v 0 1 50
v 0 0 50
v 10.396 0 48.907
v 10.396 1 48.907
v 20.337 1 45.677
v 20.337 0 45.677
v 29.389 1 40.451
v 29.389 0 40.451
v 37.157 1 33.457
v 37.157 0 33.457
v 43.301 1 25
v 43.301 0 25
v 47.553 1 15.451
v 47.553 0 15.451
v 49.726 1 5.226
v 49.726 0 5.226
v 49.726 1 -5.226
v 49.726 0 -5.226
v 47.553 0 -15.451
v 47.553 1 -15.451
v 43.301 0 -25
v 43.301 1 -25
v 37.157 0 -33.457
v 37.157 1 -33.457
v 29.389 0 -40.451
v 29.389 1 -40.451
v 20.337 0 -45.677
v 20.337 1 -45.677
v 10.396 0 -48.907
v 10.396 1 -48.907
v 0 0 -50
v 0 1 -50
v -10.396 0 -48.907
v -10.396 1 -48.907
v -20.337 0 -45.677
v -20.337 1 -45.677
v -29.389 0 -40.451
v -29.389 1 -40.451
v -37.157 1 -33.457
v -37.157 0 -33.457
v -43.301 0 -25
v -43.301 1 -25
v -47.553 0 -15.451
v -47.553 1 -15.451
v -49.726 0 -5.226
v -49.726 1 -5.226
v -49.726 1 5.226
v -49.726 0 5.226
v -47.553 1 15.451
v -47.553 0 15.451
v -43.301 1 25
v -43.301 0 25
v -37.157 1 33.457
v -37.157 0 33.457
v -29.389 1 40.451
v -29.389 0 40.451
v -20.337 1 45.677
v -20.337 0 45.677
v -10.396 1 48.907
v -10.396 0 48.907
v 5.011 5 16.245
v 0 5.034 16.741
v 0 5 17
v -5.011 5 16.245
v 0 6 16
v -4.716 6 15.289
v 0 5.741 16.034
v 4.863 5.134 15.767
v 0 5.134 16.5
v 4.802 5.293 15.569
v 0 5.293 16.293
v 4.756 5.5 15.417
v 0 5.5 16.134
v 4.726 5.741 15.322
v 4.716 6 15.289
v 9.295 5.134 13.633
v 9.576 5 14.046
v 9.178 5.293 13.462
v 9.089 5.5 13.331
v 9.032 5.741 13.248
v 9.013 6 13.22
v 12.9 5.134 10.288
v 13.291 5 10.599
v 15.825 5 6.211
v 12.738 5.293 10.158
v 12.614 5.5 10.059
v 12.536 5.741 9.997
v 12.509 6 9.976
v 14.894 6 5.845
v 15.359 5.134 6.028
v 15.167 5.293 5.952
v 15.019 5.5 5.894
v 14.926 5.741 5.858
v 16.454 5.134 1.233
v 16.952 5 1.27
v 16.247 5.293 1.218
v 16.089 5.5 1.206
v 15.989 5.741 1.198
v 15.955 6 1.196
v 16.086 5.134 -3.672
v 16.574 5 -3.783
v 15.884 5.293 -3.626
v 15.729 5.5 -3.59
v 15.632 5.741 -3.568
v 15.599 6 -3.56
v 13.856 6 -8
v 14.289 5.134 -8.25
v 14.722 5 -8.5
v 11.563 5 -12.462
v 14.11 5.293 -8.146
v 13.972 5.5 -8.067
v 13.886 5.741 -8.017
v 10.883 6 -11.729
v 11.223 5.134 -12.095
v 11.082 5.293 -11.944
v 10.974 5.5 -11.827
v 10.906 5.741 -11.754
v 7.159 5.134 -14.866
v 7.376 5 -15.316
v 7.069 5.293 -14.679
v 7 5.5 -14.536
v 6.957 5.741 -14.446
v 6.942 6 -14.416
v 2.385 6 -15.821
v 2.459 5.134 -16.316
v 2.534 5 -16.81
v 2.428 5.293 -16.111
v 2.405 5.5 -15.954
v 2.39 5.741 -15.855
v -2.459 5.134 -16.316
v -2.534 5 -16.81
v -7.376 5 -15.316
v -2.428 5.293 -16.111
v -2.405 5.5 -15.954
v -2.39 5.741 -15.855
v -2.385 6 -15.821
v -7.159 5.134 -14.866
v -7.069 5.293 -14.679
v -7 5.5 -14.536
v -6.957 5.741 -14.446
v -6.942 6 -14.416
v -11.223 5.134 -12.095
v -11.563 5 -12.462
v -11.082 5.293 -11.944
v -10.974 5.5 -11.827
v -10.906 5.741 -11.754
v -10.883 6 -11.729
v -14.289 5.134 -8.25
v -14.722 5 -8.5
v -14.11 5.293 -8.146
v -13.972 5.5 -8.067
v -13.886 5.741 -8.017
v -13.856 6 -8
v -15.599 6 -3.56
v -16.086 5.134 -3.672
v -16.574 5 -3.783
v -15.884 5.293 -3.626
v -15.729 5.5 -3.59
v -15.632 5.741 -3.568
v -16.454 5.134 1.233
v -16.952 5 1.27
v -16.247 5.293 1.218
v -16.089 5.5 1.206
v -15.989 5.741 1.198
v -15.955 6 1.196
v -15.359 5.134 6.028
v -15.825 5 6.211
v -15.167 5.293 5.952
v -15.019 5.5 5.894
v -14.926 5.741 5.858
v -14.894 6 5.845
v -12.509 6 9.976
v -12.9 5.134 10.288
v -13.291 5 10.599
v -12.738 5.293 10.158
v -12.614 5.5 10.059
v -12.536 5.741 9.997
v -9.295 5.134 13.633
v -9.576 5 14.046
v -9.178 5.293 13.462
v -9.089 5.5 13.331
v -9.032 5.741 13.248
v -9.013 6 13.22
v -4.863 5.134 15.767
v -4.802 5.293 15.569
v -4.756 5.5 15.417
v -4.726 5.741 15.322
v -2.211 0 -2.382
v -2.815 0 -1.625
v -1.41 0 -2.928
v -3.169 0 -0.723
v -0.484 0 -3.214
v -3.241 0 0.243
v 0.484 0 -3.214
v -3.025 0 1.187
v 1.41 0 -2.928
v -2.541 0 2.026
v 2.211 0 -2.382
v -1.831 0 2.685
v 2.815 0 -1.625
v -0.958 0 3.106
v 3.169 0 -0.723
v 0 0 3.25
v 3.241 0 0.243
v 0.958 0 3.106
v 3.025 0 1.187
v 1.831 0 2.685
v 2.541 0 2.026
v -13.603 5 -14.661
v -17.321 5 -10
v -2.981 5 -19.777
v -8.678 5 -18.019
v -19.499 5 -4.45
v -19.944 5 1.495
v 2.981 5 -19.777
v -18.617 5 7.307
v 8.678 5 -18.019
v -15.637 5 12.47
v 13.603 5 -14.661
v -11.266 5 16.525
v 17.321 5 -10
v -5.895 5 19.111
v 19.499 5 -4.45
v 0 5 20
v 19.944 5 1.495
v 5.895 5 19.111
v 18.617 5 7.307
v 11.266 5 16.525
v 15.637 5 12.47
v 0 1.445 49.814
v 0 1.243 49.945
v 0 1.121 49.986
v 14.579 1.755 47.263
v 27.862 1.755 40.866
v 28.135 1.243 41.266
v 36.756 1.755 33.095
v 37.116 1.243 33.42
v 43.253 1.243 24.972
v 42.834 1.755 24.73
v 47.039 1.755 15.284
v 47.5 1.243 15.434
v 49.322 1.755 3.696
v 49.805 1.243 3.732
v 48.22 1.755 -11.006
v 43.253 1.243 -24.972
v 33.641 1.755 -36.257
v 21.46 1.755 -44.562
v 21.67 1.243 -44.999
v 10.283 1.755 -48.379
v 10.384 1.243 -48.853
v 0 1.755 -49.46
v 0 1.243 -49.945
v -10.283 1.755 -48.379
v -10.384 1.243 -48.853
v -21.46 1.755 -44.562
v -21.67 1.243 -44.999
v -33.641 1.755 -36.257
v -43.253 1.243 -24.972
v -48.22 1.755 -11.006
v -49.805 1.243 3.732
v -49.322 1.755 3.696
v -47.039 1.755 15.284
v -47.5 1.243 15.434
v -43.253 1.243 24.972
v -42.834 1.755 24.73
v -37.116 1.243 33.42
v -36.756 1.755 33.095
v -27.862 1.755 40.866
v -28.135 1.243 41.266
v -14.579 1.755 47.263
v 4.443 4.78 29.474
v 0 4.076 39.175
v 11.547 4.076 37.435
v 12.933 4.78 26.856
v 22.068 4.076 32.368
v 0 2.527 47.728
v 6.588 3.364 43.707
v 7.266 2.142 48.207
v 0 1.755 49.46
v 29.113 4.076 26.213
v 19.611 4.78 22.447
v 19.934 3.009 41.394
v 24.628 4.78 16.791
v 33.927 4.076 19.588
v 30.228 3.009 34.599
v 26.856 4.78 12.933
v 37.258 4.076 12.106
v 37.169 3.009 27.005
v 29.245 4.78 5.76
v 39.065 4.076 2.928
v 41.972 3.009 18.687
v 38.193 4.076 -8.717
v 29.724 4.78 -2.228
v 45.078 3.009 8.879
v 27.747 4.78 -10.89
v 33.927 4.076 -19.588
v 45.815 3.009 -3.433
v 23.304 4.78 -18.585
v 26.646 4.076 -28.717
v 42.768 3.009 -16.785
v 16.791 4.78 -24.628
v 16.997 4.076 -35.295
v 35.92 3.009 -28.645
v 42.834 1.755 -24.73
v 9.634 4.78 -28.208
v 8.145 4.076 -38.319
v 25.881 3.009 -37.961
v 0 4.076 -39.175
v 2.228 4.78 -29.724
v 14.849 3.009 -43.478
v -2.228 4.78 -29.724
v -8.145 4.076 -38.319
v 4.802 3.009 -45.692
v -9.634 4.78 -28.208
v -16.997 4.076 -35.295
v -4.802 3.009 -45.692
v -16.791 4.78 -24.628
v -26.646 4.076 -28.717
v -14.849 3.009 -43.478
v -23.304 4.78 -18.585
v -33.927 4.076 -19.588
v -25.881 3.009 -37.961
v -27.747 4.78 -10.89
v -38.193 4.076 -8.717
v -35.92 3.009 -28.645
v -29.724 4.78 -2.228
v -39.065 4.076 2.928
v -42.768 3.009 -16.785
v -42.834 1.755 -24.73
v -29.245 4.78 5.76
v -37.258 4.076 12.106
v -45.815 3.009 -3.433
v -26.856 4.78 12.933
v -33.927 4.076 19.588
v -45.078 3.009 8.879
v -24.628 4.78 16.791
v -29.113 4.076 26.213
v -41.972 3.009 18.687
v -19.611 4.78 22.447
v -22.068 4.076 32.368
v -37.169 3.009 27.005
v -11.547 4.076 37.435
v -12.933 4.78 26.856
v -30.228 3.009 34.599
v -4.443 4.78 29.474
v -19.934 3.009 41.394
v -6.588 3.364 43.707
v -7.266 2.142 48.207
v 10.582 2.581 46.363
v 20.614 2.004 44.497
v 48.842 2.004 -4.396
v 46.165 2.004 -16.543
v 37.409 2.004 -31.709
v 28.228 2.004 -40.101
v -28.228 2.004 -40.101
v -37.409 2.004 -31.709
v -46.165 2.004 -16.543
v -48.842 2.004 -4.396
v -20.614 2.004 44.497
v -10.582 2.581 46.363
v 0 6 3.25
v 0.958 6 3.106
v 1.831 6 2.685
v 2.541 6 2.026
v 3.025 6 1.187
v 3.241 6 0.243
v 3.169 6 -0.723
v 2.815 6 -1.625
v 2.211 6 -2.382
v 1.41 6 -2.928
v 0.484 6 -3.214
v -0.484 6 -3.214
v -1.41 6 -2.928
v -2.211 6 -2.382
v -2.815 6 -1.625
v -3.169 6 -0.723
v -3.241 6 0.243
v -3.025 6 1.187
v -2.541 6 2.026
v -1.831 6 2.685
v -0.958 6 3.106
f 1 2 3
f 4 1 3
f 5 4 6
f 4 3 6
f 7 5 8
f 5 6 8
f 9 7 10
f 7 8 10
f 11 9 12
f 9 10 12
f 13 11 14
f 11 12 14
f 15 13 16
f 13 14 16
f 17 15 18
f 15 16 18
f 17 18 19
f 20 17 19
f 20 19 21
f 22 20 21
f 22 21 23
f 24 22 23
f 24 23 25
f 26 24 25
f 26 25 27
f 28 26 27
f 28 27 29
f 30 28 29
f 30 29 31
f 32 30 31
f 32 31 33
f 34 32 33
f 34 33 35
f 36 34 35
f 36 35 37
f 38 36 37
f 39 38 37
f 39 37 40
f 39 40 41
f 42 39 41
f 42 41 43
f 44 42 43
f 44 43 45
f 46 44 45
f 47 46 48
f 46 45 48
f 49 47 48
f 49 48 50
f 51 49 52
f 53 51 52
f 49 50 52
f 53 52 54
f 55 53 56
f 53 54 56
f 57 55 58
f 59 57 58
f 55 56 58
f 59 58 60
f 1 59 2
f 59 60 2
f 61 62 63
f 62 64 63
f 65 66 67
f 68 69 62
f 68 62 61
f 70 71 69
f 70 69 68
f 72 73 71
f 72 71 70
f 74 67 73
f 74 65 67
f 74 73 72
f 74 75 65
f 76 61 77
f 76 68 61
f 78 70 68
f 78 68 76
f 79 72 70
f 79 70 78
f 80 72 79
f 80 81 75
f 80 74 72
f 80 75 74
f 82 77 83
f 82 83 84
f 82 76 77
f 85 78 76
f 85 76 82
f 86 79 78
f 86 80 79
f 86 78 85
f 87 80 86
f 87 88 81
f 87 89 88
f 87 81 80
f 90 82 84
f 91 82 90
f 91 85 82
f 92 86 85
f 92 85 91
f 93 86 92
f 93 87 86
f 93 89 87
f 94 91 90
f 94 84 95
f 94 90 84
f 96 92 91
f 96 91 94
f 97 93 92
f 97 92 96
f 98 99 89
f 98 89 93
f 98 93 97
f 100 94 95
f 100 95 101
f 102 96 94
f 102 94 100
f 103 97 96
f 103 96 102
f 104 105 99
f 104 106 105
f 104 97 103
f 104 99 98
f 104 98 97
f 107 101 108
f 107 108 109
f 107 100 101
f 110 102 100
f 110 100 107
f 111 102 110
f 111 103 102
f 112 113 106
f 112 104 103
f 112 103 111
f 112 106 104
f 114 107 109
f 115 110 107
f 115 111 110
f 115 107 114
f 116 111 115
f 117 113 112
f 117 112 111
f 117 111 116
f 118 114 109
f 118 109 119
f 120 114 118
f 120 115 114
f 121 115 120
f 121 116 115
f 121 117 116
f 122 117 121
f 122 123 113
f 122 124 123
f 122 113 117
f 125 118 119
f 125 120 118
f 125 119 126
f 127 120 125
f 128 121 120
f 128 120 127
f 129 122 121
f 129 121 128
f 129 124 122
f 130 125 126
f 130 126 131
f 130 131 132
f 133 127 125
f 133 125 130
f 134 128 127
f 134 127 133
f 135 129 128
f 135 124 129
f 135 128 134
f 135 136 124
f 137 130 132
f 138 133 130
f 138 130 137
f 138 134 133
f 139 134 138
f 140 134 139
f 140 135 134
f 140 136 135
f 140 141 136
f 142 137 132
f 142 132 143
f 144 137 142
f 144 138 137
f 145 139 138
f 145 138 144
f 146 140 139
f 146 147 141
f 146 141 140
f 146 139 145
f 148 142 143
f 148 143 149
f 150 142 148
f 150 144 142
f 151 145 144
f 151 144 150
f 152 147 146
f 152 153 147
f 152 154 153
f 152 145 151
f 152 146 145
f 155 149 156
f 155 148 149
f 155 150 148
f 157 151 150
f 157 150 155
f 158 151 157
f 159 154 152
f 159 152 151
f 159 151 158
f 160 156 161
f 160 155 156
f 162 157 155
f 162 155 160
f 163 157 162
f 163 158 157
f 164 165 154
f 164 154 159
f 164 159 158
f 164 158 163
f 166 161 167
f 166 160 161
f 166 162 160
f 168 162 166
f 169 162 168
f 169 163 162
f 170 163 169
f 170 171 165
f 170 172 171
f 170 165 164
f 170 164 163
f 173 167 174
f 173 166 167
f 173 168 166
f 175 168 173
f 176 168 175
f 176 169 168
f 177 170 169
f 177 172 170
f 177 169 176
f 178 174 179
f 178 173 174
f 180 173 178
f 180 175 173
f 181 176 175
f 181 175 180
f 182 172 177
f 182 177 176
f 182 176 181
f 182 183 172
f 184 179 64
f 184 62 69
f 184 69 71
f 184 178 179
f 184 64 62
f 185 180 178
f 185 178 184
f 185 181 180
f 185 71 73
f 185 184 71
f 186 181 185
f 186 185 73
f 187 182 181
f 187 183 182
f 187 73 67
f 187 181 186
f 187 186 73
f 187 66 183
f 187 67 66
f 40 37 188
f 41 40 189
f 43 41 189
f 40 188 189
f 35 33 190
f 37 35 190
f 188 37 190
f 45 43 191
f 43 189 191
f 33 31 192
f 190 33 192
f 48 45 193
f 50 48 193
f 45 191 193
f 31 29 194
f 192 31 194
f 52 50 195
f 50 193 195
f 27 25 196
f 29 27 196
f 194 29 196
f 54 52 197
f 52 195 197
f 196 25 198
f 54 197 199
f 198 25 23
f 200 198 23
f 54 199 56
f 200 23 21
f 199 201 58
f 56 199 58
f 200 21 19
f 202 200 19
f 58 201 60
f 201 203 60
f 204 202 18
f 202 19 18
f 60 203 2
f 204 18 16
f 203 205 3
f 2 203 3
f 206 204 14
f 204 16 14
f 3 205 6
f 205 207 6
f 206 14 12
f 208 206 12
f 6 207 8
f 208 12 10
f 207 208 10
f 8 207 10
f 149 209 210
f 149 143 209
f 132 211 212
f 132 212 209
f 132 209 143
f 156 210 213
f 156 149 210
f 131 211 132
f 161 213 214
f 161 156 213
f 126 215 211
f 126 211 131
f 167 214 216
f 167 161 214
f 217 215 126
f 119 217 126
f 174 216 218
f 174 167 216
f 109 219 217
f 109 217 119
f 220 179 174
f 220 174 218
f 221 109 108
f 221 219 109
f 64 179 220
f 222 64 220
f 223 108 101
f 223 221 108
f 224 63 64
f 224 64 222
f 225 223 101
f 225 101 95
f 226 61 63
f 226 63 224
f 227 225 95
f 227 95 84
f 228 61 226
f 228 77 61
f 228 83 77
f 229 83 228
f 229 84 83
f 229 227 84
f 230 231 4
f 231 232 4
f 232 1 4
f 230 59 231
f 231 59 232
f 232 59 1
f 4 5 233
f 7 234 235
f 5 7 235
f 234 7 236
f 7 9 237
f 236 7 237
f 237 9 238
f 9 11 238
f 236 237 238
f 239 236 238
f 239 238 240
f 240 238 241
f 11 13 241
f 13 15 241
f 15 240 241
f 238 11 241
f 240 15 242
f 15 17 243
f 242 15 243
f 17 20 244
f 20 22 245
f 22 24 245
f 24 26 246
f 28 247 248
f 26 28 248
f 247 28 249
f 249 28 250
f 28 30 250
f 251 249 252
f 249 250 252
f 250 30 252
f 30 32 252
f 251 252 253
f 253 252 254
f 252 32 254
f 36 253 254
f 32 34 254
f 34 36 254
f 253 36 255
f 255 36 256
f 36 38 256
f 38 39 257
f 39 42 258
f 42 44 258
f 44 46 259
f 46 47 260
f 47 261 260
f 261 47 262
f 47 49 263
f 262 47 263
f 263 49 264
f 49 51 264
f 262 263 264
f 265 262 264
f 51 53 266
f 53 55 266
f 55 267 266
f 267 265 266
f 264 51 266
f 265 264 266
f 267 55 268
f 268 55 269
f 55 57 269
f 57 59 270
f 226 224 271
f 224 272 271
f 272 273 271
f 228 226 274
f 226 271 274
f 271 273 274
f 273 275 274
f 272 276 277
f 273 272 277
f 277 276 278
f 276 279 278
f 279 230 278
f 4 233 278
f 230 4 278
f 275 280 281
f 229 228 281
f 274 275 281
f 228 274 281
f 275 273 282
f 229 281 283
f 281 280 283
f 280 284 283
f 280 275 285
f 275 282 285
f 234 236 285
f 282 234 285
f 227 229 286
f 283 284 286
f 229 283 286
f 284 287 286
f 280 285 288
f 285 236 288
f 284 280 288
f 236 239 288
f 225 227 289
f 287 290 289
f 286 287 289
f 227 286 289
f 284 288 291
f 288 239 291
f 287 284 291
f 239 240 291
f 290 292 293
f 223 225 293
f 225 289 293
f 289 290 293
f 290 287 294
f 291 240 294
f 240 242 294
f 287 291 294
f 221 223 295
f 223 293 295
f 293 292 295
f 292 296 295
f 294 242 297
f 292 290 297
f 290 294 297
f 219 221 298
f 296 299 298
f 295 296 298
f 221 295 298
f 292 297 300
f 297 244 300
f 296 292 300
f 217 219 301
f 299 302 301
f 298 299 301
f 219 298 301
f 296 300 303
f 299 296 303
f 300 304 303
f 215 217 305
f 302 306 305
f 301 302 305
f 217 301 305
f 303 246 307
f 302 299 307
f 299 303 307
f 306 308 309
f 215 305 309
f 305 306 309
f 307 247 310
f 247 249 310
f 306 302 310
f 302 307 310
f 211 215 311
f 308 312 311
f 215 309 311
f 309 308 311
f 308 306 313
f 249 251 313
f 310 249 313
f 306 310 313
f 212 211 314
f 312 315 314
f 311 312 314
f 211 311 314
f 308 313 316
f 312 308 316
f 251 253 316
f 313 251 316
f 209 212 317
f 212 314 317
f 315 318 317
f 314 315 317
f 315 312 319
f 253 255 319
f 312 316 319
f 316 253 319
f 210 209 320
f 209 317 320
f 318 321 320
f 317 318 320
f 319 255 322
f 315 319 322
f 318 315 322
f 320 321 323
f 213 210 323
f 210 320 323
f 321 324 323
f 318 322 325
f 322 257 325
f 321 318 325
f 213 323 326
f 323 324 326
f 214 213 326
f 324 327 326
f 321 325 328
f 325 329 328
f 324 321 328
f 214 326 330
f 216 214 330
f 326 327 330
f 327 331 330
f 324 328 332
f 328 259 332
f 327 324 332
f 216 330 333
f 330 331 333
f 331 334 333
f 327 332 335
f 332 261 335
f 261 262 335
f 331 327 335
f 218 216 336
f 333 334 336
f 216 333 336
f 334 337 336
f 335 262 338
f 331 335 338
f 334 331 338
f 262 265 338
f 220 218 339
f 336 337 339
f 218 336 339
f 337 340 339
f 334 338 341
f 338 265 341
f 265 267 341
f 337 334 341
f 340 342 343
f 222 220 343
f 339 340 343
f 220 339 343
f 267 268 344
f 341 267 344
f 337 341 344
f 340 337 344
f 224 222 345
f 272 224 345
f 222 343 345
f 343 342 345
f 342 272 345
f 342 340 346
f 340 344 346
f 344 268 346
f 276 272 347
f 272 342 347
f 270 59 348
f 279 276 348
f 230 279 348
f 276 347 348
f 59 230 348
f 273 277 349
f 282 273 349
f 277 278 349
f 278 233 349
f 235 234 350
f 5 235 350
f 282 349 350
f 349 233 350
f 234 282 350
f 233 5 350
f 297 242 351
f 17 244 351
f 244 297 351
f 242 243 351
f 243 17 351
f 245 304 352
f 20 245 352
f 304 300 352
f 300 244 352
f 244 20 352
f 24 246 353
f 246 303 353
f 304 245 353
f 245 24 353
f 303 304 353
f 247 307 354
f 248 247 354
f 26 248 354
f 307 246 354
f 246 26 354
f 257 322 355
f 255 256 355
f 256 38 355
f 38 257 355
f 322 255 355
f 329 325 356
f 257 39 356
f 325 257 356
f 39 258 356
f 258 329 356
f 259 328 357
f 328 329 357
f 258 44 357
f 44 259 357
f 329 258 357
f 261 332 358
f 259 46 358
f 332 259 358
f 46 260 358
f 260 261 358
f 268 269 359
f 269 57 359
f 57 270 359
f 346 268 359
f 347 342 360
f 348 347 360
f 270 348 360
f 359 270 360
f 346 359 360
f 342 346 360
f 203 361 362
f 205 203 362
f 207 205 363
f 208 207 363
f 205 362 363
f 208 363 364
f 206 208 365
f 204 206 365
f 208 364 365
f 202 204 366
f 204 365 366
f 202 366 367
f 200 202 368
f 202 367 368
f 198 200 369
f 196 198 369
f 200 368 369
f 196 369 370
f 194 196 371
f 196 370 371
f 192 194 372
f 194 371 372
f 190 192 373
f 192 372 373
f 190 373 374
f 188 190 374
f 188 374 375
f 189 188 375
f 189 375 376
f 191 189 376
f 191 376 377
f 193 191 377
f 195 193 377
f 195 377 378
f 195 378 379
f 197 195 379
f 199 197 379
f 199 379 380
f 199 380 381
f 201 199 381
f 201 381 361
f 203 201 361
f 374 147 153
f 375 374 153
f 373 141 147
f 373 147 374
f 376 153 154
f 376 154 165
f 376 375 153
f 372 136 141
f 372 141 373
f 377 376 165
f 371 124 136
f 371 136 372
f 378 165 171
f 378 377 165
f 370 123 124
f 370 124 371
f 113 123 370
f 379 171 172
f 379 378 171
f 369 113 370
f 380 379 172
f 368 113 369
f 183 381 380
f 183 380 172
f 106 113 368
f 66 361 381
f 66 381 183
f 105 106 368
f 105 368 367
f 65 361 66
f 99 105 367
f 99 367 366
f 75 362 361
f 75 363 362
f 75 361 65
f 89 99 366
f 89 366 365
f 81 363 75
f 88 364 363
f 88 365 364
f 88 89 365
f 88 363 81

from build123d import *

# Parameters (mm, degrees)
SKETCH1_R           = 50
BOSS_EXTRUDE1_DEPTH = 5
SKETCH2_R           = 16
BOSS_EXTRUDE2_DEPTH = 1
SKETCH3_R           = 3.25
CUT_EXTRUDE1_DEPTH  = 71.964779997
FILLET1_R           = 1
FILLET2_SIZE        = 30
FILLET2_SIZE_2      = 4


# Some blends are built 0.0001 mm under size
with BuildPart() as part:
    # Sketch1 → Boss-Extrude1 (new body)
    with BuildSketch(Plane(origin=(0, 0, 0), x_dir=(1, 0, 0), z_dir=(0, 1, 0))):
        with Locations(Location((0, 0, 0), (0, 0, 270))):
            Circle(SKETCH1_R)
    extrude(amount=BOSS_EXTRUDE1_DEPTH)

    # Sketch2 → Boss-Extrude2 (add)
    with BuildSketch(Plane(origin=(0, 5, 0), x_dir=(1, 0, 0), z_dir=(0, 1, 0))):
        with Locations(Location((0, 0, 0), (0, 0, 270))):
            Circle(SKETCH2_R)
    extrude(amount=BOSS_EXTRUDE2_DEPTH)

    # Sketch3 → Cut-Extrude1 (cut, through all)
    with BuildSketch(Plane(origin=(0, 6, 0), x_dir=(1, 0, 0), z_dir=(0, 1, 0))):
        with Locations(Location((0, 0, 0), (0, 0, 270))):
            Circle(SKETCH3_R)
    extrude(amount=-CUT_EXTRUDE1_DEPTH, mode=Mode.SUBTRACT)

    # Fillet1
    fillet1_edges = [part.edges().sort_by_distance(p)[0] for p in [
        (0, 5, -16),
    ]]
    fillet(fillet1_edges, radius=FILLET1_R - 0.0001)  # a hair under: the kernel refuses the full size

    # Fillet2
    # an asymmetric fillet: 30, 4 mm, written as the material it takes off along each edge
    with BuildSketch(Plane(origin=(0, 5, 0), x_dir=(0, 0, 1), z_dir=(-1, 0, 0))) as fillet2_piece_1:
        with BuildLine():
            Bezier((50 - FILLET2_SIZE, 0), (50, 0), (50, -FILLET2_SIZE_2), weights=[1, 0.707106781, 1])
            Line((50, -FILLET2_SIZE_2), (50, 0))
            Line((50, 0), (50 - FILLET2_SIZE, 0))
        make_face()
    revolve(axis=Axis((0, 5, 0), (0, 1, 0)), mode=Mode.SUBTRACT)


solid = part.part
